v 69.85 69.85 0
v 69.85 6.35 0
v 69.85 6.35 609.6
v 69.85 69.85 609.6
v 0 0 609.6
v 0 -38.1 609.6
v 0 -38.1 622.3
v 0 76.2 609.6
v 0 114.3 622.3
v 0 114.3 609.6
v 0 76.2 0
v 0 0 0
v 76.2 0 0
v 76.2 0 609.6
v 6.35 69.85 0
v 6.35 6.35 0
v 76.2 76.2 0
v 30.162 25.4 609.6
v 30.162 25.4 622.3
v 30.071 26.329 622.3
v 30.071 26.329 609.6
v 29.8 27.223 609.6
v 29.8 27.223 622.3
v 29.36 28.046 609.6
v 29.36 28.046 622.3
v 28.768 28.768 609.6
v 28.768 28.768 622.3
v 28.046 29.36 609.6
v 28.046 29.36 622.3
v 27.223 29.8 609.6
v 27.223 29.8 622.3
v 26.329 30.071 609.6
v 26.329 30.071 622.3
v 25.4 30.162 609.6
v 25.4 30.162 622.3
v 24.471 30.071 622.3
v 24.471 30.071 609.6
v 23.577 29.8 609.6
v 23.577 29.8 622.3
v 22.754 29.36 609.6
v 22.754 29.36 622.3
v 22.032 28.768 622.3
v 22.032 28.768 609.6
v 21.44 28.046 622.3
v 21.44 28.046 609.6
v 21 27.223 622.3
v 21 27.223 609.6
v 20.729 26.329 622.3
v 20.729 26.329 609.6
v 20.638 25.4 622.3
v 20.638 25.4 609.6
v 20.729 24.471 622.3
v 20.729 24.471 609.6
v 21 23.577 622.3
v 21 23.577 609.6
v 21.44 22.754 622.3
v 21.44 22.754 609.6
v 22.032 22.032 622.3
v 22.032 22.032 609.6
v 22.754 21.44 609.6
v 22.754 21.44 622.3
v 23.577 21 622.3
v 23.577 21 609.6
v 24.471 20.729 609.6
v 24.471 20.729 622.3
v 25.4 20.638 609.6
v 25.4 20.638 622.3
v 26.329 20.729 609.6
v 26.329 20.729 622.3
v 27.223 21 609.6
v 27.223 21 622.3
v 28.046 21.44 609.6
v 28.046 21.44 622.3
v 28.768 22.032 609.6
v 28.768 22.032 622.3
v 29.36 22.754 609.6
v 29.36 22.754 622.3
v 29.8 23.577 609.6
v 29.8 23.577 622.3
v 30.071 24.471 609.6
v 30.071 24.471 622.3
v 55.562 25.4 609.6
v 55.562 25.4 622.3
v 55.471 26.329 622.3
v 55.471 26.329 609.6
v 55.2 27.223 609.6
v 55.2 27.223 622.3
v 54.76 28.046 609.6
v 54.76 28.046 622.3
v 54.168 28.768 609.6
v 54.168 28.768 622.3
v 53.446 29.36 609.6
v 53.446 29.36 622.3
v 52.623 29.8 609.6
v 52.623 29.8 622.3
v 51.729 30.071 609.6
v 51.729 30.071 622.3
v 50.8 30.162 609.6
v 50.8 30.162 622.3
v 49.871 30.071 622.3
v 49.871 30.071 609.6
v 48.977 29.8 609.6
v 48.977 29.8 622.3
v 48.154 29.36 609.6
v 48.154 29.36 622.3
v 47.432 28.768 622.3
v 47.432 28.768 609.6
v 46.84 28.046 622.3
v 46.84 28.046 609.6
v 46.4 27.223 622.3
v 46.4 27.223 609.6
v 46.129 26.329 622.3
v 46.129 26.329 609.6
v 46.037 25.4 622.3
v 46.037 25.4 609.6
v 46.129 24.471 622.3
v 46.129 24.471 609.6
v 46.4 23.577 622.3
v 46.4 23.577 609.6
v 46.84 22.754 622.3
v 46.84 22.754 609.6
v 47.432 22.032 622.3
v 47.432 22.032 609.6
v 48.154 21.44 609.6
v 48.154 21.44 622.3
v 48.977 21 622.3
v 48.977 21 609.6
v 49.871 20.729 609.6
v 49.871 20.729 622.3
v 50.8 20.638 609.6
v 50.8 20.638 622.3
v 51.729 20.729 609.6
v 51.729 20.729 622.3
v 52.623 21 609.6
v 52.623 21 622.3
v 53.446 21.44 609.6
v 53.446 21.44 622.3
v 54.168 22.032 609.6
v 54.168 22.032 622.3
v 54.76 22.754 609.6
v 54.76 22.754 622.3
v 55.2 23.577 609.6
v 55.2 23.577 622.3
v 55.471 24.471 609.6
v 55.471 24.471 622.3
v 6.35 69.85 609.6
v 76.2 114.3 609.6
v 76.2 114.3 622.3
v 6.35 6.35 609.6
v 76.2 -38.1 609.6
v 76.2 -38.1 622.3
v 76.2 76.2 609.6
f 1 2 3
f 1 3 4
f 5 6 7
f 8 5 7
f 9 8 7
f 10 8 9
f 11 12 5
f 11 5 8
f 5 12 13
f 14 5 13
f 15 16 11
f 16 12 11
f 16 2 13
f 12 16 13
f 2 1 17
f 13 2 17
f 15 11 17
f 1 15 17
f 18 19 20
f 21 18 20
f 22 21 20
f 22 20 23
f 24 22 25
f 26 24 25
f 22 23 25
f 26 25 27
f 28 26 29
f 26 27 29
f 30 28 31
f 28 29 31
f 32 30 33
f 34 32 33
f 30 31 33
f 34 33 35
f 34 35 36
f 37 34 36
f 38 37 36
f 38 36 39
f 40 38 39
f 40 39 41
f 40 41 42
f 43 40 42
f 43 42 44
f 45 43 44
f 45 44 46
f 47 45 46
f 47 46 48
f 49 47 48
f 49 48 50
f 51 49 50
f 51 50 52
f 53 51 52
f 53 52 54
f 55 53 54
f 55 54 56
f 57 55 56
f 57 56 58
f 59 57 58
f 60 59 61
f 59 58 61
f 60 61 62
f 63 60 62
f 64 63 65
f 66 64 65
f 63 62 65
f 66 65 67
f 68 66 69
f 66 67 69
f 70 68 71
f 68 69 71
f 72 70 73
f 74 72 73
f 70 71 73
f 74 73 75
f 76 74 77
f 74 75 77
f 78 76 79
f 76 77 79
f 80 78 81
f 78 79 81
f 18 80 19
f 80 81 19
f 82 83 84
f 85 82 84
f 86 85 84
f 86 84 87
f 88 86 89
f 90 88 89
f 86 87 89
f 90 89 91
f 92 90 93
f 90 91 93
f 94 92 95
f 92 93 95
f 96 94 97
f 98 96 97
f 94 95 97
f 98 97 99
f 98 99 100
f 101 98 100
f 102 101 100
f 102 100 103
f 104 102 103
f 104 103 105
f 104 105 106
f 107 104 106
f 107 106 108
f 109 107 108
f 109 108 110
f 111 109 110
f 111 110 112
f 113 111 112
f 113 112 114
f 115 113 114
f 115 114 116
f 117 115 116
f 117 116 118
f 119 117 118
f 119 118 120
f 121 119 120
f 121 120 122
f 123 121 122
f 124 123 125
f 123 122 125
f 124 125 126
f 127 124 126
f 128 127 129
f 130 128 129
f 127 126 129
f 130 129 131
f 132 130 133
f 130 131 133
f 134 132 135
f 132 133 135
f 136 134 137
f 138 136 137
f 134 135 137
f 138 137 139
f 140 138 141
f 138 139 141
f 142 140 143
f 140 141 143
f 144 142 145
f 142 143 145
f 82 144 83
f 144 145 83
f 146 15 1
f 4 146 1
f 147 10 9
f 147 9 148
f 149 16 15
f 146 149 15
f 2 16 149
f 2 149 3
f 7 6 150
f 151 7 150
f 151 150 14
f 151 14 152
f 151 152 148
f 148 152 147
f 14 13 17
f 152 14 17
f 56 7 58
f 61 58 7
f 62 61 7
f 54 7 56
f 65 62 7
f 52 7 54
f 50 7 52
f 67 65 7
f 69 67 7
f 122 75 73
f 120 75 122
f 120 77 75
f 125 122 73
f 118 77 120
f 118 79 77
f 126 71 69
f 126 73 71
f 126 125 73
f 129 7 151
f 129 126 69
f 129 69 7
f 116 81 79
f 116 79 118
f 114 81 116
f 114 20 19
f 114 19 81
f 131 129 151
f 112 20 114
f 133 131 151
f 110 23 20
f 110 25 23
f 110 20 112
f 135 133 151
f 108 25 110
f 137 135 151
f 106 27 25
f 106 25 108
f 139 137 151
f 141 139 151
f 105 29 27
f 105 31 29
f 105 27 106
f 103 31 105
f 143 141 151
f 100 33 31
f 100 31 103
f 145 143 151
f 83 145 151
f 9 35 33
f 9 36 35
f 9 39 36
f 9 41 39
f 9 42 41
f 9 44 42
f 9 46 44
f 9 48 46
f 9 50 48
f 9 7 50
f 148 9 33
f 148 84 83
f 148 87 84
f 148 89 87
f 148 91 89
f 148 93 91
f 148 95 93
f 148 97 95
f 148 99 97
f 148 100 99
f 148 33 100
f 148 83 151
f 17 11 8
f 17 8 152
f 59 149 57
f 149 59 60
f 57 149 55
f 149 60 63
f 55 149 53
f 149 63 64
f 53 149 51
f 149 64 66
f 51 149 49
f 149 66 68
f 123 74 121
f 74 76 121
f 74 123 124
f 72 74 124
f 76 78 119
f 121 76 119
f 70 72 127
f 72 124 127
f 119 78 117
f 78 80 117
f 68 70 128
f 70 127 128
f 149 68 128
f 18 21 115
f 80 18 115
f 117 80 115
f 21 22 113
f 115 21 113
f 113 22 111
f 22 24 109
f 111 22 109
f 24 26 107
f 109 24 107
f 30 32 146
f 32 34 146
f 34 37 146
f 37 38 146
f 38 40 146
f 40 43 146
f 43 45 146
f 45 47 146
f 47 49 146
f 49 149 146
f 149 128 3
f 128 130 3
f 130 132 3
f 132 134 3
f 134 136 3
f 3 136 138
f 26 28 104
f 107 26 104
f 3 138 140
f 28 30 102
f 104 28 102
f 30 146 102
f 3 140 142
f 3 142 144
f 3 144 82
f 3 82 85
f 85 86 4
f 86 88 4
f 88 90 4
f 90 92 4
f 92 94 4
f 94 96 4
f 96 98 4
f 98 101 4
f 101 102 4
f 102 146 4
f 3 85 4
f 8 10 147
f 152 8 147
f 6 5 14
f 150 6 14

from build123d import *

# Parameters (mm, degrees)
F0_W     = 76.2
F0_H     = 76.2
F0_W_2   = 63.5
F0_H_2   = 63.5
F1_DEPTH = 609.6
F2_W     = 76.2
F2_H     = 152.4
F3_DEPTH = 12.7
F4_R     = 4.7625
F5_DEPTH = 25.4


with BuildPart() as f1:
    # F0 (on Top) → F1 (new body)
    with BuildSketch(Plane.XY):
        with Locations((38.1, 38.1)):
            Rectangle(F0_W, F0_H)
        with Locations((38.1, 38.1)):
            Rectangle(F0_W_2, F0_H_2, mode=Mode.SUBTRACT)
    extrude(amount=F1_DEPTH)

    # F2 (on face) → F3 (join)
    with BuildSketch(Plane.XY.offset(609.6)):
        with Locations((38.1, 38.1)):
            Rectangle(F2_W, F2_H)
    extrude(amount=F3_DEPTH)

    # F4 (on face) → F5 (cut)
    with BuildSketch(Plane.XY.offset(622.3)):
        with Locations((50.8, 25.4)):
            Circle(F4_R)
        with Locations((25.4, 25.4)):
            Circle(F4_R)
    extrude(amount=-F5_DEPTH, mode=Mode.SUBTRACT)


solid = f1.part
